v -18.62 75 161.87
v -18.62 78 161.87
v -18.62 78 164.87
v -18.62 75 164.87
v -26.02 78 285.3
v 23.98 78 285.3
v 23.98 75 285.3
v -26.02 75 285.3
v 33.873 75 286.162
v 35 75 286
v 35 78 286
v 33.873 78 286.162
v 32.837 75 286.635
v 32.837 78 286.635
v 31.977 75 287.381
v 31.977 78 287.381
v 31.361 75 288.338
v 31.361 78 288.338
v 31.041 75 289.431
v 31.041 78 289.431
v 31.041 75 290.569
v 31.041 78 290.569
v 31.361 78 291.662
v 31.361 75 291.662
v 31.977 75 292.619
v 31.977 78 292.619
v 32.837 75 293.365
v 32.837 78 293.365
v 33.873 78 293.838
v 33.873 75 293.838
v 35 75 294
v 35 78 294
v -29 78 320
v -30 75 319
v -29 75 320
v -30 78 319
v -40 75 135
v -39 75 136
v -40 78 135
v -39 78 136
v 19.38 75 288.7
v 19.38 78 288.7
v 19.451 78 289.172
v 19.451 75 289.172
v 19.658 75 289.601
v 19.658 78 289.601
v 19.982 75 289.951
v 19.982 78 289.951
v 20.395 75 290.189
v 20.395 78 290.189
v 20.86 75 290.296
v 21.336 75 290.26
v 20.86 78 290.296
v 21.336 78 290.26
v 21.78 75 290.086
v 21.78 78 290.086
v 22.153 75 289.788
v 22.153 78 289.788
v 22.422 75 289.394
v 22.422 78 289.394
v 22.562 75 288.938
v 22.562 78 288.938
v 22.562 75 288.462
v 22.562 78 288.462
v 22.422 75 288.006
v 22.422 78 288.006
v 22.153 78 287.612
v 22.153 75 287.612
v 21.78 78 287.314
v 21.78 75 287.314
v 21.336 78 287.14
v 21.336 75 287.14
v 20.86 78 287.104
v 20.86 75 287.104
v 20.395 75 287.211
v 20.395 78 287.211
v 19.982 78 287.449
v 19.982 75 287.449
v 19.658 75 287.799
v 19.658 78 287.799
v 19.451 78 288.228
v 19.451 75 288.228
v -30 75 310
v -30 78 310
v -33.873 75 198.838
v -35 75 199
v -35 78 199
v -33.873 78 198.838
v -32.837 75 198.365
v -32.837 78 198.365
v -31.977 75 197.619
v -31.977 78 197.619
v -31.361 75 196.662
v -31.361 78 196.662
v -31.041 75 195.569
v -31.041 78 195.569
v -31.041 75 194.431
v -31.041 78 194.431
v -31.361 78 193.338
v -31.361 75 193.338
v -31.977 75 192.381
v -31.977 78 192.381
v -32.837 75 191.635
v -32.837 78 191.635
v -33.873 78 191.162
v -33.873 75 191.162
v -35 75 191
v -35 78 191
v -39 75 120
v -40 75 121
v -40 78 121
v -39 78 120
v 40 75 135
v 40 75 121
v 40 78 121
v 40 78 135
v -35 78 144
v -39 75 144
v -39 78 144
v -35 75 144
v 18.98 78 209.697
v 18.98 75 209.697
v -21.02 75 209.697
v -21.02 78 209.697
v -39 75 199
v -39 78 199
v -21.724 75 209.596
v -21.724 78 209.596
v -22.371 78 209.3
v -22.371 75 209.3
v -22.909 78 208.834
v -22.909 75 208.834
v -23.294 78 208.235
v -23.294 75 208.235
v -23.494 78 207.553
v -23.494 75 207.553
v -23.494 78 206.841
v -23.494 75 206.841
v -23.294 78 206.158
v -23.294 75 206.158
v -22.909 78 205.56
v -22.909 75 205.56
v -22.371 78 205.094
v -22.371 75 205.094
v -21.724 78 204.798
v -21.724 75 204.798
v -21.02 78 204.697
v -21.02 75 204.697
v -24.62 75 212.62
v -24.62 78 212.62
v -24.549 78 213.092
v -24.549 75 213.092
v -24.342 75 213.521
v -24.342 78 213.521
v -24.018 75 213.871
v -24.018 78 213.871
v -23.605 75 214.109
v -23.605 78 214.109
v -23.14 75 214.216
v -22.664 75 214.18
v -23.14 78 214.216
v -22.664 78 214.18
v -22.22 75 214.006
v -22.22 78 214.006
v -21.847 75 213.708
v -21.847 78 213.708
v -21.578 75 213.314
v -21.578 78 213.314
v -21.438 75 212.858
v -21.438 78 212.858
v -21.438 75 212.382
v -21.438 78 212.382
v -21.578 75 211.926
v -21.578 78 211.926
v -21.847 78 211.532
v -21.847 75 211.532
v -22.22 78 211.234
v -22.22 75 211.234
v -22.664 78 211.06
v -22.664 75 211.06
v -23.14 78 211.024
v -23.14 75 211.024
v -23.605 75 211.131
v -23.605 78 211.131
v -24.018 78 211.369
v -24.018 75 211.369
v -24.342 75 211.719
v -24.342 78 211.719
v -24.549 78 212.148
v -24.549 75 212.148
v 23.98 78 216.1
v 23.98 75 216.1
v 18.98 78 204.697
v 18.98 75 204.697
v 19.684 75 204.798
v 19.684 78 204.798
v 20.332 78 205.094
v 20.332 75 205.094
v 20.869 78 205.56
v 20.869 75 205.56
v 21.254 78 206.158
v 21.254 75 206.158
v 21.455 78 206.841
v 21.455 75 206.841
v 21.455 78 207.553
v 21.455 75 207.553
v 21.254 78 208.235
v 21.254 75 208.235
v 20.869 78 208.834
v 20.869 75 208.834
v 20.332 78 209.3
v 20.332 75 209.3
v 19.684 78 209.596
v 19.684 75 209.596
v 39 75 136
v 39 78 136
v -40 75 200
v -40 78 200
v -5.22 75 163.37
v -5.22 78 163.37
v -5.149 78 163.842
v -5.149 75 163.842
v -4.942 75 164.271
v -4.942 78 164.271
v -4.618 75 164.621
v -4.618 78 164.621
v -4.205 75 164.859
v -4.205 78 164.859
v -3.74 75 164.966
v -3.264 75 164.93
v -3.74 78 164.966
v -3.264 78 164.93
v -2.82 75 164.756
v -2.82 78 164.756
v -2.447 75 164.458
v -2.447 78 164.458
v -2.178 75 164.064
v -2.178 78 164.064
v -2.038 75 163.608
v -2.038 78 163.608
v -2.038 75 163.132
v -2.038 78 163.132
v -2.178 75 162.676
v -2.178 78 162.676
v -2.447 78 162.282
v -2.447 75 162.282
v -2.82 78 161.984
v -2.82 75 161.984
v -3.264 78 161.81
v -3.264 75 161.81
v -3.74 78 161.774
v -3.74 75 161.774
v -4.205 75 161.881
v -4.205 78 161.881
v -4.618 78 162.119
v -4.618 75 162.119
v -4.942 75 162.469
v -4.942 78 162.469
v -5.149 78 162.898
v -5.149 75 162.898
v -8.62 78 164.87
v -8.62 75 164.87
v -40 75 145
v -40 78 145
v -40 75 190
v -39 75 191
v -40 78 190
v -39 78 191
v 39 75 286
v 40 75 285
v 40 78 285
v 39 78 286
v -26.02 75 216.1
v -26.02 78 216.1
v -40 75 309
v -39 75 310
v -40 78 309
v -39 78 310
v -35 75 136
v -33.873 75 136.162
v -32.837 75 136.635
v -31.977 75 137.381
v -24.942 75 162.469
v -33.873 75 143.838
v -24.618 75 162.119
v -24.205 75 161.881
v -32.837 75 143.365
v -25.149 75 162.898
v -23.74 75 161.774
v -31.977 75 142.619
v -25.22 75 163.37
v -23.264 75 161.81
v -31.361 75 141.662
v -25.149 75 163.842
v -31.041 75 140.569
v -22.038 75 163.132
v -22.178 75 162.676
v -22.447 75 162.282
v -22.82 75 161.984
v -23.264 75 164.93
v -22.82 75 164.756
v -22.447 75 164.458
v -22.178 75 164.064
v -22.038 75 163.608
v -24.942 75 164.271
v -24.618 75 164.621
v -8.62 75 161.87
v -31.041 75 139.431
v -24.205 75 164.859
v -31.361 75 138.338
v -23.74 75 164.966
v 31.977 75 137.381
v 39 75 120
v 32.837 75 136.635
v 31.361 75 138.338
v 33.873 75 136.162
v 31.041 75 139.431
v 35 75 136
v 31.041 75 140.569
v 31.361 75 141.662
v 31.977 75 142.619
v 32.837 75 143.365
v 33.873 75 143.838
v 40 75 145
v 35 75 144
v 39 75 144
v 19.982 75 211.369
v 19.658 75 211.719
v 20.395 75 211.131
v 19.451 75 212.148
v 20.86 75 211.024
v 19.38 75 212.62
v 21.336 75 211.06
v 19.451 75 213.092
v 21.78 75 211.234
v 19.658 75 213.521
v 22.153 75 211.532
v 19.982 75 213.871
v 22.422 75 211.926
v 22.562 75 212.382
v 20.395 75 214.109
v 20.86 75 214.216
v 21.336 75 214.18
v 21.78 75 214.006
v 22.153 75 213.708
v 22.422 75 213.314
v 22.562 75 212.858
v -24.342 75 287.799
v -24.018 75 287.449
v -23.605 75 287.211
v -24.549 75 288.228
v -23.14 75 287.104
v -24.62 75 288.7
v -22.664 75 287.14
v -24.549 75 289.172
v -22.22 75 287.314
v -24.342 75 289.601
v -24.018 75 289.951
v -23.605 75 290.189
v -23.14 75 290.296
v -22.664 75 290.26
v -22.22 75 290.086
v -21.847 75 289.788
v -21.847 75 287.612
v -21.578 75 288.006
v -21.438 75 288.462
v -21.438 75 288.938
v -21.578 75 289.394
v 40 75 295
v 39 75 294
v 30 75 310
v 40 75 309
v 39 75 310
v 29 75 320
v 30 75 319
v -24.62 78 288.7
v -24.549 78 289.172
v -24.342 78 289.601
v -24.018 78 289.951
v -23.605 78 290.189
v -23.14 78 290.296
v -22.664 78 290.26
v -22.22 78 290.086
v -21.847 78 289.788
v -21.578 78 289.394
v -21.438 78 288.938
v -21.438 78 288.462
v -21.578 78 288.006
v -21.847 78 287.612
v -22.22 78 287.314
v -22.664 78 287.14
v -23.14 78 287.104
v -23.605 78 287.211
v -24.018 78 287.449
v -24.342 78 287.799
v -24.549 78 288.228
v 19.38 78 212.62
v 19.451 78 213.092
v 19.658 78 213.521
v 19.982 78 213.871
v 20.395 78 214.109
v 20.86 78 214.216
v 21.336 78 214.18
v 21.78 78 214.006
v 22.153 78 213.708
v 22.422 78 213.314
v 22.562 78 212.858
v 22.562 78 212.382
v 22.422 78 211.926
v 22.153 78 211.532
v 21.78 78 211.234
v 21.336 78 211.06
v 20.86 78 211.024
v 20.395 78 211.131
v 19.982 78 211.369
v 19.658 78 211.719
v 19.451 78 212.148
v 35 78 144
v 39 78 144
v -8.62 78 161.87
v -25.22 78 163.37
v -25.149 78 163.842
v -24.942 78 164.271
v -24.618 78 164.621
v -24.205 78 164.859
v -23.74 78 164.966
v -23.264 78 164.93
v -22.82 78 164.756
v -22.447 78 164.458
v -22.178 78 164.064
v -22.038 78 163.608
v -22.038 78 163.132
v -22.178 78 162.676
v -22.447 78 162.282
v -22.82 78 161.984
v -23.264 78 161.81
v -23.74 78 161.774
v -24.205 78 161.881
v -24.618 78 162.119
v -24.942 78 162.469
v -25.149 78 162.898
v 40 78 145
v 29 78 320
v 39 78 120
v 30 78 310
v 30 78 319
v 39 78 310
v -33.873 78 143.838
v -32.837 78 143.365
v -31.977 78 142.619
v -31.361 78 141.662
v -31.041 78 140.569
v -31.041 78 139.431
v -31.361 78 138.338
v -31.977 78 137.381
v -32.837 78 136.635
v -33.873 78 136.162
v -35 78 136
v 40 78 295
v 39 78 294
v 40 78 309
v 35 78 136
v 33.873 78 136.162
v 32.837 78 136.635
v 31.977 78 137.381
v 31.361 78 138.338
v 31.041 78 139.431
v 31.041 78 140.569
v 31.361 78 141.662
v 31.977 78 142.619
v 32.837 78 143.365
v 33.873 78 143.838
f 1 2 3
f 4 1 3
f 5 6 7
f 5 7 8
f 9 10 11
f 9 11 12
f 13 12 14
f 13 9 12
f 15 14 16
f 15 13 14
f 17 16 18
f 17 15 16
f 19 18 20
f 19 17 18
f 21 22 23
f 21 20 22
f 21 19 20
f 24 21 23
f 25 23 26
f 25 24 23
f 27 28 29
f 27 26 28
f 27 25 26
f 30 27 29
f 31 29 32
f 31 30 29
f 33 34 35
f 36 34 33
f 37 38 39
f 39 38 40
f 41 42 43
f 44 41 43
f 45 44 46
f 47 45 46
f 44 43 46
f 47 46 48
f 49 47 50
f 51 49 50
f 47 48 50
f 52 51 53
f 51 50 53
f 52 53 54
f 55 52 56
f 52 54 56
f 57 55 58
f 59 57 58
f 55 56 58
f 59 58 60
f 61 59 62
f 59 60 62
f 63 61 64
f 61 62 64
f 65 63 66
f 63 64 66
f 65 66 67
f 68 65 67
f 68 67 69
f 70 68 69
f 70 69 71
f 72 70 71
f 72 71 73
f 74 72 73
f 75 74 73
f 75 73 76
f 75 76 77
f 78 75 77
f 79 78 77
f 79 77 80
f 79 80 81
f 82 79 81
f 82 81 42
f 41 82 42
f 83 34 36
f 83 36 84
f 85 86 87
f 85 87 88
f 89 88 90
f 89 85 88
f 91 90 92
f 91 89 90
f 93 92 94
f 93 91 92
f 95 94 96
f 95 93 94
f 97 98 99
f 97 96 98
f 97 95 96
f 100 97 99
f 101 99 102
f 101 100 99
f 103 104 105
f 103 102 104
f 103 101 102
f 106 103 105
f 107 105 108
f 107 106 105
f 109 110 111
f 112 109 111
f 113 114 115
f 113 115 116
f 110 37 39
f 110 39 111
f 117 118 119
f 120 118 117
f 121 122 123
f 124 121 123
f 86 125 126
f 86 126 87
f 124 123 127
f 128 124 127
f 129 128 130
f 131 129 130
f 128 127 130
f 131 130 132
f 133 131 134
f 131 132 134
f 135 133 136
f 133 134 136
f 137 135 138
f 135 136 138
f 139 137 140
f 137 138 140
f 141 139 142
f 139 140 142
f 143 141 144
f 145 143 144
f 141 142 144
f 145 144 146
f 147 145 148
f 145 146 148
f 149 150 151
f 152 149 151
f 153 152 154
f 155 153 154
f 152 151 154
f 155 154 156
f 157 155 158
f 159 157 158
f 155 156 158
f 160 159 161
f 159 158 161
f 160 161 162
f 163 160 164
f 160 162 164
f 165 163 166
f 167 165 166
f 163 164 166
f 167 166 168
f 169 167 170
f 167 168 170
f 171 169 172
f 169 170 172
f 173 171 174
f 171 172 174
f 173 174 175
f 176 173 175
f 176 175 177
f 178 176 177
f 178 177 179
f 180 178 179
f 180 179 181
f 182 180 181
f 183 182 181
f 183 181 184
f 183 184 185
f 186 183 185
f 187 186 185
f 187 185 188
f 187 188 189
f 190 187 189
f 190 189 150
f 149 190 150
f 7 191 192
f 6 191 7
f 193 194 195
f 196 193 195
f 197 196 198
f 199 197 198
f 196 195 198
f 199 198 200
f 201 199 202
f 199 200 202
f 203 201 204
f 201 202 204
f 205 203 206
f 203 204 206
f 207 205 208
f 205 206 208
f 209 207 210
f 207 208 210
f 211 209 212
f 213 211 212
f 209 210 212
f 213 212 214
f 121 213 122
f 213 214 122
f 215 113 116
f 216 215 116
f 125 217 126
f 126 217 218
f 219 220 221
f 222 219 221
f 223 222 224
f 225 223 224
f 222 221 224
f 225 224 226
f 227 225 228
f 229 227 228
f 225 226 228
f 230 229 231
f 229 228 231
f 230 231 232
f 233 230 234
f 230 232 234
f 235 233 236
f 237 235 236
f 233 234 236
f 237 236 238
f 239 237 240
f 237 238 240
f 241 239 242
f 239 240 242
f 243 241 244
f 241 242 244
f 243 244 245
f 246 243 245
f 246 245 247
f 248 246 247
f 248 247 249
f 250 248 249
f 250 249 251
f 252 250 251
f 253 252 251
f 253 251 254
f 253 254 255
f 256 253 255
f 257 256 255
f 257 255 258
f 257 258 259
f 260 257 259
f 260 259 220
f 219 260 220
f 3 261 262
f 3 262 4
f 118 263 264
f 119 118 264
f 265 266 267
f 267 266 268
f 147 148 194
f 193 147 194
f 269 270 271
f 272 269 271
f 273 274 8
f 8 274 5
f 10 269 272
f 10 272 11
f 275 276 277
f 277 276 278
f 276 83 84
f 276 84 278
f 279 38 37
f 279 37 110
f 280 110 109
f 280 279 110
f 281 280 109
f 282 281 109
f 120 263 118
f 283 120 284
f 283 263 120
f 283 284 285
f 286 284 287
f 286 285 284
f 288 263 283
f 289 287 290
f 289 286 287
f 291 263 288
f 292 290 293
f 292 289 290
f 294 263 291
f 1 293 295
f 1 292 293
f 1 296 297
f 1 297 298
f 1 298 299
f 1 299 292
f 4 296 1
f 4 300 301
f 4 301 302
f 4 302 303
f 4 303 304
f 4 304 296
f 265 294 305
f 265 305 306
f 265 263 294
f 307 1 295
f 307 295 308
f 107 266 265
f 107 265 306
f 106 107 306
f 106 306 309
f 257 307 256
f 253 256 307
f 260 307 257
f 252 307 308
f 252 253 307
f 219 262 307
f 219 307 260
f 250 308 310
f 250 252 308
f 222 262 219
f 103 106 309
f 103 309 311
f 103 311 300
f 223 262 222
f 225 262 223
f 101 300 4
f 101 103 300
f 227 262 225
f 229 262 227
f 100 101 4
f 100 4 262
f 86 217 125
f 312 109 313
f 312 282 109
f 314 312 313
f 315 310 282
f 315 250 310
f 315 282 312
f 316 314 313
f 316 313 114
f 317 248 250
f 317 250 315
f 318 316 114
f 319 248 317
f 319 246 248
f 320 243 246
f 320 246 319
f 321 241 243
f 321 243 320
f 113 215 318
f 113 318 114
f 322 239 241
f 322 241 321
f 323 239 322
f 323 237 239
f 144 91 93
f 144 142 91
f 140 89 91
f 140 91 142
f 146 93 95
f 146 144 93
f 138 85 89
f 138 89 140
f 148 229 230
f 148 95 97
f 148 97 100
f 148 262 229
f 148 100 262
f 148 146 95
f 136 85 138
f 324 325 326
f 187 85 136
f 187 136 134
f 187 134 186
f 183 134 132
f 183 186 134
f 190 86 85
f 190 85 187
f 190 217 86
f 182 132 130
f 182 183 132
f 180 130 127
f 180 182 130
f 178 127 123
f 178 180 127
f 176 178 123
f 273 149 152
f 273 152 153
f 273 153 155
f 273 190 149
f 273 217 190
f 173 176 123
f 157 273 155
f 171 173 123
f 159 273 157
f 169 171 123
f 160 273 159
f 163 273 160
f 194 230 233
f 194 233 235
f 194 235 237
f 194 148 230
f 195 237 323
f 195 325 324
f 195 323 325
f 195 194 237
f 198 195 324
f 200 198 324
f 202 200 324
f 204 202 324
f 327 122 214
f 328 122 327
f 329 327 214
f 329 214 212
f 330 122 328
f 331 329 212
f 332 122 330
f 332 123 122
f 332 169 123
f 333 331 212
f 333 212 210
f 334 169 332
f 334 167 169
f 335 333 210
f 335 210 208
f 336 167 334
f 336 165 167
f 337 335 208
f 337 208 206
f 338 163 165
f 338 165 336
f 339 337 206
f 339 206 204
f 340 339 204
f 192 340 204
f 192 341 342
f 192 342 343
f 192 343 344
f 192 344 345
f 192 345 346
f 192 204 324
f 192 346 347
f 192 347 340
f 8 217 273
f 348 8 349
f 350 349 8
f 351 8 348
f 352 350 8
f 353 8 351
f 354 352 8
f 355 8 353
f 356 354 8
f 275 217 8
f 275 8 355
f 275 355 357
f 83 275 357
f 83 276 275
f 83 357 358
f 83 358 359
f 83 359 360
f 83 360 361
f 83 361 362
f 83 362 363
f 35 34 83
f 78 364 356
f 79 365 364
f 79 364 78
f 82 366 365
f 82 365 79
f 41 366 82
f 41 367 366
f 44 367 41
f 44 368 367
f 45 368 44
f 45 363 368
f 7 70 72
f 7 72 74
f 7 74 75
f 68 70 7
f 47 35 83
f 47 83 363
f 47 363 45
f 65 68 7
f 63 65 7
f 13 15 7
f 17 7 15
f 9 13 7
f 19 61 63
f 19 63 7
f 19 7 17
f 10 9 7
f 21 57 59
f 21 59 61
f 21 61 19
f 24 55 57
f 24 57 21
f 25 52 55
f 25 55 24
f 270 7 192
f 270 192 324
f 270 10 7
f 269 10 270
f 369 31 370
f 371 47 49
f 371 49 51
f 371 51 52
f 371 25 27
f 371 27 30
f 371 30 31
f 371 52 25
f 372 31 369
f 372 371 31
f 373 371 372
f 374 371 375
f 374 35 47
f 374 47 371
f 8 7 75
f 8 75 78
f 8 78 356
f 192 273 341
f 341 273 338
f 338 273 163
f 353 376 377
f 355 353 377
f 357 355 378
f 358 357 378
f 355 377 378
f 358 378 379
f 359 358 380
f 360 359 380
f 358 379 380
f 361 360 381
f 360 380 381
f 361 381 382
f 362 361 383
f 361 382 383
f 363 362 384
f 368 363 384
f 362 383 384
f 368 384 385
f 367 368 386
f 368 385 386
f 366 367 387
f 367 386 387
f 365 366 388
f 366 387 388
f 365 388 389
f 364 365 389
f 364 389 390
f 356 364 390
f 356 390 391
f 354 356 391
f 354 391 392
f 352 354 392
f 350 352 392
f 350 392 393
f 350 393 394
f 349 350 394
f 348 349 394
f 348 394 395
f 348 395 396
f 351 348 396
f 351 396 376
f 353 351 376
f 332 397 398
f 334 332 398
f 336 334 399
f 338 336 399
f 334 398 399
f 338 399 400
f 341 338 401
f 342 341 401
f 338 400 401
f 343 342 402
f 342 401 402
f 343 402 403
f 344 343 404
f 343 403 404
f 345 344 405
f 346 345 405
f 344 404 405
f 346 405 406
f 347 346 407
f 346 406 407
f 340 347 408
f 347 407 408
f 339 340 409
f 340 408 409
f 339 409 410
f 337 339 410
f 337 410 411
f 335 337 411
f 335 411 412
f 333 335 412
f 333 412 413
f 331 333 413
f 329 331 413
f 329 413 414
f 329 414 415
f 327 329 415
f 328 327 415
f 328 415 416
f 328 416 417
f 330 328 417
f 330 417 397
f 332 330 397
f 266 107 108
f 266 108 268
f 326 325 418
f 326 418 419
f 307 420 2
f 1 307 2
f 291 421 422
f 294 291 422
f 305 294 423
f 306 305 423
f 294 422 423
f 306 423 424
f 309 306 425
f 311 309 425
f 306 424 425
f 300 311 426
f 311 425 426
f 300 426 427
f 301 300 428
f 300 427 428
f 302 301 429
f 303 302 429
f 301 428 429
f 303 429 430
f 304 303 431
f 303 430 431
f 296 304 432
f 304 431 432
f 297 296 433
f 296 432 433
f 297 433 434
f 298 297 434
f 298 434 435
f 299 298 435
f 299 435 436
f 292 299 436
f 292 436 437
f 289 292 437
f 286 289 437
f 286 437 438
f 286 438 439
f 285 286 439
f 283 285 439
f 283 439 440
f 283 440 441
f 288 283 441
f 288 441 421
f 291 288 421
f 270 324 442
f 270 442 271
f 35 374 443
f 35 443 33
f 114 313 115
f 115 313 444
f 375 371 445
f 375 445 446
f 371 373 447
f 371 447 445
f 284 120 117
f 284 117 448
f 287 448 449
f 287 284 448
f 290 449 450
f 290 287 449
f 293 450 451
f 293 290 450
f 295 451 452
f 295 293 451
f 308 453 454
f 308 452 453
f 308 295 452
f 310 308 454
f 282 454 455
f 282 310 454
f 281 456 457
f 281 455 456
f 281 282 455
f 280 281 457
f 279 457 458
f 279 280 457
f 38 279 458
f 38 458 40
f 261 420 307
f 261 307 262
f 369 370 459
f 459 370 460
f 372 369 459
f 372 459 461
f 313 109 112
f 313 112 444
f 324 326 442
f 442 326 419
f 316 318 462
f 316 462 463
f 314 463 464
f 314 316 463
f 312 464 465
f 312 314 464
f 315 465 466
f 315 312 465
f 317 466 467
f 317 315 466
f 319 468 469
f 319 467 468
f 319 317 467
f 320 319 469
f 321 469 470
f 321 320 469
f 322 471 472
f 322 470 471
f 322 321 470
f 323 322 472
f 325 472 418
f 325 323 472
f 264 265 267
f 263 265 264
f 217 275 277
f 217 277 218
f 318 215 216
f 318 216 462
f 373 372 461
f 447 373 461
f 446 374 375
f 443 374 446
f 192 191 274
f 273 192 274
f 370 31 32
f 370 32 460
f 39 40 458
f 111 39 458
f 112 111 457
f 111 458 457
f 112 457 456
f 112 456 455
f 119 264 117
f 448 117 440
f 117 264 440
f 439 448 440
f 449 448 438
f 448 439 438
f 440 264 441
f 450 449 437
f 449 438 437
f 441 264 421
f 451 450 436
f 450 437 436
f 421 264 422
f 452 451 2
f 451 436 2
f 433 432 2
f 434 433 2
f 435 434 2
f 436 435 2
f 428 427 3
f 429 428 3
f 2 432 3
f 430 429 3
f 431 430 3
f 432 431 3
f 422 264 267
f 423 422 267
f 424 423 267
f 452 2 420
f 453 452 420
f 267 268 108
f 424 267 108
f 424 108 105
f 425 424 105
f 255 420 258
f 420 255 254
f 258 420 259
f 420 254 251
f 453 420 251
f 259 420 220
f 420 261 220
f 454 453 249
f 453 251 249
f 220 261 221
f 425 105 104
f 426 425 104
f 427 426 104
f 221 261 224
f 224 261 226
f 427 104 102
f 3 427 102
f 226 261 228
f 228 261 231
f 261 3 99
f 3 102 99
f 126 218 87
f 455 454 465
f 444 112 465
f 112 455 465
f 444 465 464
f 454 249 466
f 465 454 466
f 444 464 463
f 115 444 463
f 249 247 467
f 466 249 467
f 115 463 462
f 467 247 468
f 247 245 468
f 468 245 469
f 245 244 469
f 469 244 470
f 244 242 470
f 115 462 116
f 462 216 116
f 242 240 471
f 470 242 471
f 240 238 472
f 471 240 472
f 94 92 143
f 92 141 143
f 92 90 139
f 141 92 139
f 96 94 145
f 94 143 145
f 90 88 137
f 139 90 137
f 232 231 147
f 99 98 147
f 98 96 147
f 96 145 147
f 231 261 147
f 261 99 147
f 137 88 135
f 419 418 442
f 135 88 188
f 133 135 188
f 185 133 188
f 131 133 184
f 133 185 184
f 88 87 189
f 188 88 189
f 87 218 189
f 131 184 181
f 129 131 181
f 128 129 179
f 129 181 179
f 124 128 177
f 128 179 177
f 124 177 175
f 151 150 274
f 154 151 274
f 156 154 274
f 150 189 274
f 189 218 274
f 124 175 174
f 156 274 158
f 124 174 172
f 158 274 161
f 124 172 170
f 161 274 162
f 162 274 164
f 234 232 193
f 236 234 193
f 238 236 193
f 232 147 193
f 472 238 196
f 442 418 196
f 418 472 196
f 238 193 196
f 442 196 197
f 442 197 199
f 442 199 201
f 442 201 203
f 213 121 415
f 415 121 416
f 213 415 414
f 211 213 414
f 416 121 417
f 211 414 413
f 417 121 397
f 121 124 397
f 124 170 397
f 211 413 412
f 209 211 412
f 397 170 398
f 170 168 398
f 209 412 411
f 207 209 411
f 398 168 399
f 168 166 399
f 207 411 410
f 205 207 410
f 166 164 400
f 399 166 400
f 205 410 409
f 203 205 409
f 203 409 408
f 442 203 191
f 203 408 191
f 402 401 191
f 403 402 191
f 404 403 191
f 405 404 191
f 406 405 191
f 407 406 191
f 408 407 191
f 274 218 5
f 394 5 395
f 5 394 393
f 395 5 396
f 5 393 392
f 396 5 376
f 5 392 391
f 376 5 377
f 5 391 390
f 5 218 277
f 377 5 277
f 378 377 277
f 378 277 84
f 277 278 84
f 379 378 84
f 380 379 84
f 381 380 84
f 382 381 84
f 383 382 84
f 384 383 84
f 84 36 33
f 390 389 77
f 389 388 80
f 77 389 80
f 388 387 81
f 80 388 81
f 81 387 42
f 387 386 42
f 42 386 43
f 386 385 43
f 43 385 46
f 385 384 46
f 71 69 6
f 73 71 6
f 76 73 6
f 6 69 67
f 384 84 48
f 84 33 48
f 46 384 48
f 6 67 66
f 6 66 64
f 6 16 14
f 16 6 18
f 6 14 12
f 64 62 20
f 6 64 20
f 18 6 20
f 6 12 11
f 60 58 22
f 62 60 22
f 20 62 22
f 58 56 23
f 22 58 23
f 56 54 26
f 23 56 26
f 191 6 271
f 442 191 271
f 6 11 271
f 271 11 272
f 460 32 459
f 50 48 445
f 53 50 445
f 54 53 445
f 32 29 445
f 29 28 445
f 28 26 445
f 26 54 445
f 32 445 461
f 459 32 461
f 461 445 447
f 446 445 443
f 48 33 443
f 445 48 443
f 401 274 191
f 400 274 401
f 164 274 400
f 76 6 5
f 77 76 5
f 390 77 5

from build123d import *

# Parameters (mm, degrees)
PAD098_DEPTH    = 3
POCKET028_DEPTH = 3.001
CHAMFER064_SIZE = 1
SKETCH185_R     = 1.6
SKETCH185_W     = 50
SKETCH185_H     = 69.2
POCKET029_DEPTH = 3.001
SKETCH186_R     = 1.6
SKETCH186_W     = 10
SKETCH186_H     = 3
POCKET030_DEPTH = 3.001
POCKET031_DEPTH = 3.001


with BuildPart() as part:
    # Sketch183 → Pad098 (new body)
    with BuildSketch(Plane(origin=(0, 0, 0), x_dir=(-1, 0, 0), z_dir=(0, 1, 0))):
        Polygon((-40, 310), (-30, 310), (-30, 320), (30, 320), (30, 310), (40, 310), (40, 120), (-40, 120), align=None)
    extrude(amount=PAD098_DEPTH)

    # Sketch184 → Pocket028 (cut, through all)
    with BuildSketch(Plane(origin=(0, 0, 0), x_dir=(-1, 0, 0), z_dir=(0, 1, 0))):
        with BuildLine():
            ThreePointArc((-40, 294), (-44, 290), (-40, 286))
            Line((-40, 286), (-35, 286))
            ThreePointArc((-35, 286), (-31, 290), (-35, 294))
            Line((-35, 294), (-40, 294))
        make_face()
        with BuildLine():
            ThreePointArc((-40, 144), (-44, 140), (-40, 136))
            Line((-40, 136), (-35, 136))
            ThreePointArc((-35, 136), (-31, 140), (-35, 144))
            Line((-35, 144), (-40, 144))
        make_face()
        with BuildLine():
            ThreePointArc((40, 136), (44, 140), (40, 144))
            Line((40, 144), (35, 144))
            ThreePointArc((35, 144), (31, 140), (35, 136))
            Line((35, 136), (40, 136))
        make_face()
        with BuildLine():
            ThreePointArc((40, 191), (44, 195), (40, 199))
            Line((40, 199), (35, 199))
            ThreePointArc((35, 199), (31, 195), (35, 191))
            Line((35, 191), (40, 191))
        make_face()
    extrude(amount=POCKET028_DEPTH, mode=Mode.SUBTRACT)

    # Chamfer064
    chamfer064_edges = [part.edges().sort_by_distance(p)[0] for p in [
        (40, 1.5, 310),
        (30, 1.5, 320),
        (40, 1.5, 294),
        (40, 1.5, 286),
        (-40, 1.5, 310),
        (-30, 1.5, 320),
        (40, 1.5, 144),
        (40, 1.5, 136),
        (40, 1.5, 120),
        (-40, 1.5, 120),
        (-40, 1.5, 136),
        (-40, 1.5, 144),
        (-40, 1.5, 191),
        (-40, 1.5, 199),
    ]]
    chamfer(chamfer064_edges, length=CHAMFER064_SIZE)

    # Sketch185 (on Face5 of Chamfer064) → Pocket029 (cut, through all)
    with BuildSketch(Plane(origin=(0, 3, 0), x_dir=(-1, 0, 0), z_dir=(0, 1, 0))):
        with Locations((23.02, 212.62)):
            Circle(SKETCH185_R)
        with Locations((-20.98, 212.62)):
            Circle(SKETCH185_R)
        with Locations((-20.98, 288.7)):
            Circle(SKETCH185_R)
        with Locations((23.02, 288.7)):
            Circle(SKETCH185_R)
        with Locations((1.02, 250.7)):
            Rectangle(SKETCH185_W, SKETCH185_H)
    extrude(amount=-POCKET029_DEPTH, mode=Mode.SUBTRACT)

    # Sketch186 (on Face5 of Pocket029) → Pocket030 (cut, through all)
    with BuildSketch(Plane(origin=(0, 3, 0), x_dir=(-1, 0, 0), z_dir=(0, 1, 0))):
        with Locations((23.62, 163.37)):
            Circle(SKETCH186_R)
        with Locations((3.62, 163.37)):
            Circle(SKETCH186_R)
        with Locations((13.62, 163.37)):
            Rectangle(SKETCH186_W, SKETCH186_H)
    extrude(amount=-POCKET030_DEPTH, mode=Mode.SUBTRACT)

    # Sketch187 → Pocket031 (cut, through all)
    with BuildSketch(Plane.XZ):
        with BuildLine():
            ThreePointArc((-21.019897, 209.69686), (-23.519897, 207.19686), (-21.019897, 204.69686))
            Line((-21.019897, 204.69686), (18.980103, 204.69686))
            ThreePointArc((18.980103, 204.69686), (21.480103, 207.19686), (18.980103, 209.69686))
            Line((18.980103, 209.69686), (-21.019897, 209.69686))
        make_face()
    extrude(amount=-POCKET031_DEPTH, mode=Mode.SUBTRACT)


with BuildPart() as part_1:
    # Body086 placement: moved
    add(part.part.moved(Location((0, 75, 0))))


solid = part_1.part
